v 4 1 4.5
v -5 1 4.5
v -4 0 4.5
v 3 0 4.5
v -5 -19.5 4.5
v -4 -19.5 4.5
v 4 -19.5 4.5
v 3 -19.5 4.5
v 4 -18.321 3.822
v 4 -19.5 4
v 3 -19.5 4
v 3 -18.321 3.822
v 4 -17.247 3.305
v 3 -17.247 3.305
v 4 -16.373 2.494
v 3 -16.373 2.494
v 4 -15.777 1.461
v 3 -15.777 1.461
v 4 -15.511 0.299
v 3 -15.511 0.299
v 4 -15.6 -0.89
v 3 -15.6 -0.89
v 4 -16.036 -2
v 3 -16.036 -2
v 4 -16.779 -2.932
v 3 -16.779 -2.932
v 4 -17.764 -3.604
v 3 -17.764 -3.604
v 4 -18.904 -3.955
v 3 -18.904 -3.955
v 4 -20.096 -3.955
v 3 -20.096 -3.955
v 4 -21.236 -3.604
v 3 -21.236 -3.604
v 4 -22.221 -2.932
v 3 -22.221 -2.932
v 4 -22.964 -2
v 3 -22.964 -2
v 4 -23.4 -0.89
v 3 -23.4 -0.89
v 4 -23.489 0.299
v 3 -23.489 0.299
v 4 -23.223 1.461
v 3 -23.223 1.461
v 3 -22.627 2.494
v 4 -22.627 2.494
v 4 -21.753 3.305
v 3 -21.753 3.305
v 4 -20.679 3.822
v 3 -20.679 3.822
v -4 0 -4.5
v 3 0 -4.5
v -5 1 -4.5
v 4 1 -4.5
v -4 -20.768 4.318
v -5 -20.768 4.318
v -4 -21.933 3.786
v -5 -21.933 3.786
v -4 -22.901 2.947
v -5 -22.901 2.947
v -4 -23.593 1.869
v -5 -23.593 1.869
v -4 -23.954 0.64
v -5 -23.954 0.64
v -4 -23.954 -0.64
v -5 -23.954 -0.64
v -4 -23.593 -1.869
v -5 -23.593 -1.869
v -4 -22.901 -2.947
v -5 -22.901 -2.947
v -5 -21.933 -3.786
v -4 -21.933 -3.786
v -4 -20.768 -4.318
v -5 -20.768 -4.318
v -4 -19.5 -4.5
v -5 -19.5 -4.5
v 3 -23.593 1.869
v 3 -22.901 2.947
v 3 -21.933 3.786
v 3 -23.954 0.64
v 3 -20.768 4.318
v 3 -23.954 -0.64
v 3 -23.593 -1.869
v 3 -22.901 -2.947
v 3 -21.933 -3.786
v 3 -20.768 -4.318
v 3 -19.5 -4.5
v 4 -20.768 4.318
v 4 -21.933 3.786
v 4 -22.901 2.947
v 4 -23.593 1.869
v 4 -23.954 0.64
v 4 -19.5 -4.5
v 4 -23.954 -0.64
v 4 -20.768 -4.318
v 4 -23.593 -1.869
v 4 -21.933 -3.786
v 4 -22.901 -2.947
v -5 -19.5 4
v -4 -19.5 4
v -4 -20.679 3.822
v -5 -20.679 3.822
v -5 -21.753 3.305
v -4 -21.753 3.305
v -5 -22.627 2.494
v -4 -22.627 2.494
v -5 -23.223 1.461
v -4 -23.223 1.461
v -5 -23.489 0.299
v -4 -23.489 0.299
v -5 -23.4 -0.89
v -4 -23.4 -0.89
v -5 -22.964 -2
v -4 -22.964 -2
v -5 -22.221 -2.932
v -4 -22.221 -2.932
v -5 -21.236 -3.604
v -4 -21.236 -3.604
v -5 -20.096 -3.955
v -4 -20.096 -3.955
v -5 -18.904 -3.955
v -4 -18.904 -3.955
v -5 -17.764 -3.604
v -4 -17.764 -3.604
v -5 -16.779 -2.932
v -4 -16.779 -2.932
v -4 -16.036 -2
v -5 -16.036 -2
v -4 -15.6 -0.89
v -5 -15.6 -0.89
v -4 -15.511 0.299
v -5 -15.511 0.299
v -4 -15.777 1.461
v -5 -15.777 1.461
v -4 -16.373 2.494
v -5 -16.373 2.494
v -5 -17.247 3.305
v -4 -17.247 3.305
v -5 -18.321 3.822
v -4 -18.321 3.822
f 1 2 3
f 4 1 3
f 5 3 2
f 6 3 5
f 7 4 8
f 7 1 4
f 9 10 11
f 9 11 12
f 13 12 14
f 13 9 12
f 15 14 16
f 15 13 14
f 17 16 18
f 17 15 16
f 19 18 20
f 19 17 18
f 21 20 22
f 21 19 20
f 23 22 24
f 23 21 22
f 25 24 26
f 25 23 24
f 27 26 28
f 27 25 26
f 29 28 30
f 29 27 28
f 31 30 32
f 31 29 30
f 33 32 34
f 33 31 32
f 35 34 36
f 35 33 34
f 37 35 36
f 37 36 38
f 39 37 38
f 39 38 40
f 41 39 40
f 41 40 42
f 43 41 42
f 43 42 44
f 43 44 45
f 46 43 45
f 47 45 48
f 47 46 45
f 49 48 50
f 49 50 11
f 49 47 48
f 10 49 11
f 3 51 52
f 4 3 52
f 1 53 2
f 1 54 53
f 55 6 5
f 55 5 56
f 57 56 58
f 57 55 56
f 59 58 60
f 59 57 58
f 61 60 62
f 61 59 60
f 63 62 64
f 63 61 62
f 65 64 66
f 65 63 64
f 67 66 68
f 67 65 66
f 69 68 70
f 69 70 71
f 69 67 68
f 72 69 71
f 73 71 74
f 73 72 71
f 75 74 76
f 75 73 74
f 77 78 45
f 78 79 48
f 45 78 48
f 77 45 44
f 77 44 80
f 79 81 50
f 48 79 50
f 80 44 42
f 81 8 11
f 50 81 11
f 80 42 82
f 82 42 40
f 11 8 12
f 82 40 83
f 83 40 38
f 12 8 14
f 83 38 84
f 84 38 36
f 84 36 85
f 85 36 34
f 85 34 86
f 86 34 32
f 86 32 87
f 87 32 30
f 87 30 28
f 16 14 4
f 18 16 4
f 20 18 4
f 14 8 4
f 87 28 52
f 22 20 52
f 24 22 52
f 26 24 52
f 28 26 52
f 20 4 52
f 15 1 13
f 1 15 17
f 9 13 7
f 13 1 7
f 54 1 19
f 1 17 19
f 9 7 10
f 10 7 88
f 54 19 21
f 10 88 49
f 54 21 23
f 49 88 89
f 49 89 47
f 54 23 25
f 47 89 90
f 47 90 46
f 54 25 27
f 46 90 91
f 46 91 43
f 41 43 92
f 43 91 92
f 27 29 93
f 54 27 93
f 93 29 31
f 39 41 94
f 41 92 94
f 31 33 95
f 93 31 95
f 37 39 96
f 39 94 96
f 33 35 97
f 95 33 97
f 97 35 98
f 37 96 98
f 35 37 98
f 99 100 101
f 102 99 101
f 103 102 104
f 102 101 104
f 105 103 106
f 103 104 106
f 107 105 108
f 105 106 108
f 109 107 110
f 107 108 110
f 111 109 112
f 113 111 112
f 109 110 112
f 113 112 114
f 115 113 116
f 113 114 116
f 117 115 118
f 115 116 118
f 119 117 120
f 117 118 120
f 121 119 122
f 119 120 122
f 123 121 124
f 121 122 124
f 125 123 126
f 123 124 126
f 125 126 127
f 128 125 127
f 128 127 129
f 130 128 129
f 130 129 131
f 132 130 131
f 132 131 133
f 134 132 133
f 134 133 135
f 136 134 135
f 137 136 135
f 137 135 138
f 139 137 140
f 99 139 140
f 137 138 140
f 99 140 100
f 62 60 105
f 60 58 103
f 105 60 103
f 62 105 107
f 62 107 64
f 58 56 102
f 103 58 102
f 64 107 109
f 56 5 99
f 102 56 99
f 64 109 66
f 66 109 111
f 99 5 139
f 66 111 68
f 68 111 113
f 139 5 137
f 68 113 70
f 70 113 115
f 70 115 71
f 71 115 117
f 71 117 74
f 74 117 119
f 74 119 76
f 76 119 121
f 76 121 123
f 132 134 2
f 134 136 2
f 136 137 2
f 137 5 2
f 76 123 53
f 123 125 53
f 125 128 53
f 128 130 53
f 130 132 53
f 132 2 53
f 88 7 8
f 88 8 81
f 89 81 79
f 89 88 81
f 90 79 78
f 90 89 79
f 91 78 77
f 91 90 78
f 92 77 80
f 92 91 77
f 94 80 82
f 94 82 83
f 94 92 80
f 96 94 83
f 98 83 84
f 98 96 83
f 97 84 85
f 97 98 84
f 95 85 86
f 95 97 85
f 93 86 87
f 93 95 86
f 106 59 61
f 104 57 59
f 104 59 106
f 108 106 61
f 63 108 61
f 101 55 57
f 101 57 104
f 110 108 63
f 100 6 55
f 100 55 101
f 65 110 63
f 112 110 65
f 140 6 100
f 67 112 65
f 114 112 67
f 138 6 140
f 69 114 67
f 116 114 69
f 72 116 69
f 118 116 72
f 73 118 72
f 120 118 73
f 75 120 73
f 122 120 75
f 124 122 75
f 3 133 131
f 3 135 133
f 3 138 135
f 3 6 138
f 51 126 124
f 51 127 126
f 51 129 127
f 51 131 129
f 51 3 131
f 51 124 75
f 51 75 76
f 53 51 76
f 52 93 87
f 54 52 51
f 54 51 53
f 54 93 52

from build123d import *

# Parameters (mm, degrees)
SKETCH1_W           = 8
SKETCH1_H           = 9
BOSS_EXTRUDE1_DEPTH = 1
SKETCH6_R           = 4
BOSS_EXTRUDE2_DEPTH = 1
SKETCH9_R           = 4
BOSS_EXTRUDE3_DEPTH = 1


with BuildPart() as part:
    # Sketch1 → Boss-Extrude1 (new body)
    with BuildSketch(Plane(origin=(0, 0, 0), x_dir=(1, 0, 0), z_dir=(0, 1, 0))):
        Rectangle(SKETCH1_W, SKETCH1_H)
    extrude(amount=BOSS_EXTRUDE1_DEPTH)

    # Sketch6 → Boss-Extrude2 (add)
    with BuildSketch(Plane.ZY.offset(-4)):
        with BuildLine():
            Line((4.5, 1), (4.5, -19.5))
            ThreePointArc((4.5, -19.5), (0, -24), (-4.5, -19.5))
            Line((-4.5, -19.5), (-4.5, 1))
            Line((-4.5, 1), (4.5, 1))
        make_face()
        with Locations((0, -19.5)):
            Circle(SKETCH6_R, mode=Mode.SUBTRACT)
    extrude(amount=BOSS_EXTRUDE2_DEPTH)

    # Sketch9 → Boss-Extrude3 (add)
    with BuildSketch(Plane(origin=(-4, 0, 0), x_dir=(0, 0, -1), z_dir=(1, 0, 0))):
        with BuildLine():
            Line((-4.5, 1), (-4.5, -19.5))
            ThreePointArc((-4.5, -19.5), (0, -24), (4.5, -19.5))
            Line((4.5, -19.5), (4.5, 1))
            Line((4.5, 1), (-4.5, 1))
        make_face()
        with Locations(Location((0, -19.5, 0), (0, 0, 180))):
            Circle(SKETCH9_R, mode=Mode.SUBTRACT)
    extrude(amount=-BOSS_EXTRUDE3_DEPTH)


solid = part.part
